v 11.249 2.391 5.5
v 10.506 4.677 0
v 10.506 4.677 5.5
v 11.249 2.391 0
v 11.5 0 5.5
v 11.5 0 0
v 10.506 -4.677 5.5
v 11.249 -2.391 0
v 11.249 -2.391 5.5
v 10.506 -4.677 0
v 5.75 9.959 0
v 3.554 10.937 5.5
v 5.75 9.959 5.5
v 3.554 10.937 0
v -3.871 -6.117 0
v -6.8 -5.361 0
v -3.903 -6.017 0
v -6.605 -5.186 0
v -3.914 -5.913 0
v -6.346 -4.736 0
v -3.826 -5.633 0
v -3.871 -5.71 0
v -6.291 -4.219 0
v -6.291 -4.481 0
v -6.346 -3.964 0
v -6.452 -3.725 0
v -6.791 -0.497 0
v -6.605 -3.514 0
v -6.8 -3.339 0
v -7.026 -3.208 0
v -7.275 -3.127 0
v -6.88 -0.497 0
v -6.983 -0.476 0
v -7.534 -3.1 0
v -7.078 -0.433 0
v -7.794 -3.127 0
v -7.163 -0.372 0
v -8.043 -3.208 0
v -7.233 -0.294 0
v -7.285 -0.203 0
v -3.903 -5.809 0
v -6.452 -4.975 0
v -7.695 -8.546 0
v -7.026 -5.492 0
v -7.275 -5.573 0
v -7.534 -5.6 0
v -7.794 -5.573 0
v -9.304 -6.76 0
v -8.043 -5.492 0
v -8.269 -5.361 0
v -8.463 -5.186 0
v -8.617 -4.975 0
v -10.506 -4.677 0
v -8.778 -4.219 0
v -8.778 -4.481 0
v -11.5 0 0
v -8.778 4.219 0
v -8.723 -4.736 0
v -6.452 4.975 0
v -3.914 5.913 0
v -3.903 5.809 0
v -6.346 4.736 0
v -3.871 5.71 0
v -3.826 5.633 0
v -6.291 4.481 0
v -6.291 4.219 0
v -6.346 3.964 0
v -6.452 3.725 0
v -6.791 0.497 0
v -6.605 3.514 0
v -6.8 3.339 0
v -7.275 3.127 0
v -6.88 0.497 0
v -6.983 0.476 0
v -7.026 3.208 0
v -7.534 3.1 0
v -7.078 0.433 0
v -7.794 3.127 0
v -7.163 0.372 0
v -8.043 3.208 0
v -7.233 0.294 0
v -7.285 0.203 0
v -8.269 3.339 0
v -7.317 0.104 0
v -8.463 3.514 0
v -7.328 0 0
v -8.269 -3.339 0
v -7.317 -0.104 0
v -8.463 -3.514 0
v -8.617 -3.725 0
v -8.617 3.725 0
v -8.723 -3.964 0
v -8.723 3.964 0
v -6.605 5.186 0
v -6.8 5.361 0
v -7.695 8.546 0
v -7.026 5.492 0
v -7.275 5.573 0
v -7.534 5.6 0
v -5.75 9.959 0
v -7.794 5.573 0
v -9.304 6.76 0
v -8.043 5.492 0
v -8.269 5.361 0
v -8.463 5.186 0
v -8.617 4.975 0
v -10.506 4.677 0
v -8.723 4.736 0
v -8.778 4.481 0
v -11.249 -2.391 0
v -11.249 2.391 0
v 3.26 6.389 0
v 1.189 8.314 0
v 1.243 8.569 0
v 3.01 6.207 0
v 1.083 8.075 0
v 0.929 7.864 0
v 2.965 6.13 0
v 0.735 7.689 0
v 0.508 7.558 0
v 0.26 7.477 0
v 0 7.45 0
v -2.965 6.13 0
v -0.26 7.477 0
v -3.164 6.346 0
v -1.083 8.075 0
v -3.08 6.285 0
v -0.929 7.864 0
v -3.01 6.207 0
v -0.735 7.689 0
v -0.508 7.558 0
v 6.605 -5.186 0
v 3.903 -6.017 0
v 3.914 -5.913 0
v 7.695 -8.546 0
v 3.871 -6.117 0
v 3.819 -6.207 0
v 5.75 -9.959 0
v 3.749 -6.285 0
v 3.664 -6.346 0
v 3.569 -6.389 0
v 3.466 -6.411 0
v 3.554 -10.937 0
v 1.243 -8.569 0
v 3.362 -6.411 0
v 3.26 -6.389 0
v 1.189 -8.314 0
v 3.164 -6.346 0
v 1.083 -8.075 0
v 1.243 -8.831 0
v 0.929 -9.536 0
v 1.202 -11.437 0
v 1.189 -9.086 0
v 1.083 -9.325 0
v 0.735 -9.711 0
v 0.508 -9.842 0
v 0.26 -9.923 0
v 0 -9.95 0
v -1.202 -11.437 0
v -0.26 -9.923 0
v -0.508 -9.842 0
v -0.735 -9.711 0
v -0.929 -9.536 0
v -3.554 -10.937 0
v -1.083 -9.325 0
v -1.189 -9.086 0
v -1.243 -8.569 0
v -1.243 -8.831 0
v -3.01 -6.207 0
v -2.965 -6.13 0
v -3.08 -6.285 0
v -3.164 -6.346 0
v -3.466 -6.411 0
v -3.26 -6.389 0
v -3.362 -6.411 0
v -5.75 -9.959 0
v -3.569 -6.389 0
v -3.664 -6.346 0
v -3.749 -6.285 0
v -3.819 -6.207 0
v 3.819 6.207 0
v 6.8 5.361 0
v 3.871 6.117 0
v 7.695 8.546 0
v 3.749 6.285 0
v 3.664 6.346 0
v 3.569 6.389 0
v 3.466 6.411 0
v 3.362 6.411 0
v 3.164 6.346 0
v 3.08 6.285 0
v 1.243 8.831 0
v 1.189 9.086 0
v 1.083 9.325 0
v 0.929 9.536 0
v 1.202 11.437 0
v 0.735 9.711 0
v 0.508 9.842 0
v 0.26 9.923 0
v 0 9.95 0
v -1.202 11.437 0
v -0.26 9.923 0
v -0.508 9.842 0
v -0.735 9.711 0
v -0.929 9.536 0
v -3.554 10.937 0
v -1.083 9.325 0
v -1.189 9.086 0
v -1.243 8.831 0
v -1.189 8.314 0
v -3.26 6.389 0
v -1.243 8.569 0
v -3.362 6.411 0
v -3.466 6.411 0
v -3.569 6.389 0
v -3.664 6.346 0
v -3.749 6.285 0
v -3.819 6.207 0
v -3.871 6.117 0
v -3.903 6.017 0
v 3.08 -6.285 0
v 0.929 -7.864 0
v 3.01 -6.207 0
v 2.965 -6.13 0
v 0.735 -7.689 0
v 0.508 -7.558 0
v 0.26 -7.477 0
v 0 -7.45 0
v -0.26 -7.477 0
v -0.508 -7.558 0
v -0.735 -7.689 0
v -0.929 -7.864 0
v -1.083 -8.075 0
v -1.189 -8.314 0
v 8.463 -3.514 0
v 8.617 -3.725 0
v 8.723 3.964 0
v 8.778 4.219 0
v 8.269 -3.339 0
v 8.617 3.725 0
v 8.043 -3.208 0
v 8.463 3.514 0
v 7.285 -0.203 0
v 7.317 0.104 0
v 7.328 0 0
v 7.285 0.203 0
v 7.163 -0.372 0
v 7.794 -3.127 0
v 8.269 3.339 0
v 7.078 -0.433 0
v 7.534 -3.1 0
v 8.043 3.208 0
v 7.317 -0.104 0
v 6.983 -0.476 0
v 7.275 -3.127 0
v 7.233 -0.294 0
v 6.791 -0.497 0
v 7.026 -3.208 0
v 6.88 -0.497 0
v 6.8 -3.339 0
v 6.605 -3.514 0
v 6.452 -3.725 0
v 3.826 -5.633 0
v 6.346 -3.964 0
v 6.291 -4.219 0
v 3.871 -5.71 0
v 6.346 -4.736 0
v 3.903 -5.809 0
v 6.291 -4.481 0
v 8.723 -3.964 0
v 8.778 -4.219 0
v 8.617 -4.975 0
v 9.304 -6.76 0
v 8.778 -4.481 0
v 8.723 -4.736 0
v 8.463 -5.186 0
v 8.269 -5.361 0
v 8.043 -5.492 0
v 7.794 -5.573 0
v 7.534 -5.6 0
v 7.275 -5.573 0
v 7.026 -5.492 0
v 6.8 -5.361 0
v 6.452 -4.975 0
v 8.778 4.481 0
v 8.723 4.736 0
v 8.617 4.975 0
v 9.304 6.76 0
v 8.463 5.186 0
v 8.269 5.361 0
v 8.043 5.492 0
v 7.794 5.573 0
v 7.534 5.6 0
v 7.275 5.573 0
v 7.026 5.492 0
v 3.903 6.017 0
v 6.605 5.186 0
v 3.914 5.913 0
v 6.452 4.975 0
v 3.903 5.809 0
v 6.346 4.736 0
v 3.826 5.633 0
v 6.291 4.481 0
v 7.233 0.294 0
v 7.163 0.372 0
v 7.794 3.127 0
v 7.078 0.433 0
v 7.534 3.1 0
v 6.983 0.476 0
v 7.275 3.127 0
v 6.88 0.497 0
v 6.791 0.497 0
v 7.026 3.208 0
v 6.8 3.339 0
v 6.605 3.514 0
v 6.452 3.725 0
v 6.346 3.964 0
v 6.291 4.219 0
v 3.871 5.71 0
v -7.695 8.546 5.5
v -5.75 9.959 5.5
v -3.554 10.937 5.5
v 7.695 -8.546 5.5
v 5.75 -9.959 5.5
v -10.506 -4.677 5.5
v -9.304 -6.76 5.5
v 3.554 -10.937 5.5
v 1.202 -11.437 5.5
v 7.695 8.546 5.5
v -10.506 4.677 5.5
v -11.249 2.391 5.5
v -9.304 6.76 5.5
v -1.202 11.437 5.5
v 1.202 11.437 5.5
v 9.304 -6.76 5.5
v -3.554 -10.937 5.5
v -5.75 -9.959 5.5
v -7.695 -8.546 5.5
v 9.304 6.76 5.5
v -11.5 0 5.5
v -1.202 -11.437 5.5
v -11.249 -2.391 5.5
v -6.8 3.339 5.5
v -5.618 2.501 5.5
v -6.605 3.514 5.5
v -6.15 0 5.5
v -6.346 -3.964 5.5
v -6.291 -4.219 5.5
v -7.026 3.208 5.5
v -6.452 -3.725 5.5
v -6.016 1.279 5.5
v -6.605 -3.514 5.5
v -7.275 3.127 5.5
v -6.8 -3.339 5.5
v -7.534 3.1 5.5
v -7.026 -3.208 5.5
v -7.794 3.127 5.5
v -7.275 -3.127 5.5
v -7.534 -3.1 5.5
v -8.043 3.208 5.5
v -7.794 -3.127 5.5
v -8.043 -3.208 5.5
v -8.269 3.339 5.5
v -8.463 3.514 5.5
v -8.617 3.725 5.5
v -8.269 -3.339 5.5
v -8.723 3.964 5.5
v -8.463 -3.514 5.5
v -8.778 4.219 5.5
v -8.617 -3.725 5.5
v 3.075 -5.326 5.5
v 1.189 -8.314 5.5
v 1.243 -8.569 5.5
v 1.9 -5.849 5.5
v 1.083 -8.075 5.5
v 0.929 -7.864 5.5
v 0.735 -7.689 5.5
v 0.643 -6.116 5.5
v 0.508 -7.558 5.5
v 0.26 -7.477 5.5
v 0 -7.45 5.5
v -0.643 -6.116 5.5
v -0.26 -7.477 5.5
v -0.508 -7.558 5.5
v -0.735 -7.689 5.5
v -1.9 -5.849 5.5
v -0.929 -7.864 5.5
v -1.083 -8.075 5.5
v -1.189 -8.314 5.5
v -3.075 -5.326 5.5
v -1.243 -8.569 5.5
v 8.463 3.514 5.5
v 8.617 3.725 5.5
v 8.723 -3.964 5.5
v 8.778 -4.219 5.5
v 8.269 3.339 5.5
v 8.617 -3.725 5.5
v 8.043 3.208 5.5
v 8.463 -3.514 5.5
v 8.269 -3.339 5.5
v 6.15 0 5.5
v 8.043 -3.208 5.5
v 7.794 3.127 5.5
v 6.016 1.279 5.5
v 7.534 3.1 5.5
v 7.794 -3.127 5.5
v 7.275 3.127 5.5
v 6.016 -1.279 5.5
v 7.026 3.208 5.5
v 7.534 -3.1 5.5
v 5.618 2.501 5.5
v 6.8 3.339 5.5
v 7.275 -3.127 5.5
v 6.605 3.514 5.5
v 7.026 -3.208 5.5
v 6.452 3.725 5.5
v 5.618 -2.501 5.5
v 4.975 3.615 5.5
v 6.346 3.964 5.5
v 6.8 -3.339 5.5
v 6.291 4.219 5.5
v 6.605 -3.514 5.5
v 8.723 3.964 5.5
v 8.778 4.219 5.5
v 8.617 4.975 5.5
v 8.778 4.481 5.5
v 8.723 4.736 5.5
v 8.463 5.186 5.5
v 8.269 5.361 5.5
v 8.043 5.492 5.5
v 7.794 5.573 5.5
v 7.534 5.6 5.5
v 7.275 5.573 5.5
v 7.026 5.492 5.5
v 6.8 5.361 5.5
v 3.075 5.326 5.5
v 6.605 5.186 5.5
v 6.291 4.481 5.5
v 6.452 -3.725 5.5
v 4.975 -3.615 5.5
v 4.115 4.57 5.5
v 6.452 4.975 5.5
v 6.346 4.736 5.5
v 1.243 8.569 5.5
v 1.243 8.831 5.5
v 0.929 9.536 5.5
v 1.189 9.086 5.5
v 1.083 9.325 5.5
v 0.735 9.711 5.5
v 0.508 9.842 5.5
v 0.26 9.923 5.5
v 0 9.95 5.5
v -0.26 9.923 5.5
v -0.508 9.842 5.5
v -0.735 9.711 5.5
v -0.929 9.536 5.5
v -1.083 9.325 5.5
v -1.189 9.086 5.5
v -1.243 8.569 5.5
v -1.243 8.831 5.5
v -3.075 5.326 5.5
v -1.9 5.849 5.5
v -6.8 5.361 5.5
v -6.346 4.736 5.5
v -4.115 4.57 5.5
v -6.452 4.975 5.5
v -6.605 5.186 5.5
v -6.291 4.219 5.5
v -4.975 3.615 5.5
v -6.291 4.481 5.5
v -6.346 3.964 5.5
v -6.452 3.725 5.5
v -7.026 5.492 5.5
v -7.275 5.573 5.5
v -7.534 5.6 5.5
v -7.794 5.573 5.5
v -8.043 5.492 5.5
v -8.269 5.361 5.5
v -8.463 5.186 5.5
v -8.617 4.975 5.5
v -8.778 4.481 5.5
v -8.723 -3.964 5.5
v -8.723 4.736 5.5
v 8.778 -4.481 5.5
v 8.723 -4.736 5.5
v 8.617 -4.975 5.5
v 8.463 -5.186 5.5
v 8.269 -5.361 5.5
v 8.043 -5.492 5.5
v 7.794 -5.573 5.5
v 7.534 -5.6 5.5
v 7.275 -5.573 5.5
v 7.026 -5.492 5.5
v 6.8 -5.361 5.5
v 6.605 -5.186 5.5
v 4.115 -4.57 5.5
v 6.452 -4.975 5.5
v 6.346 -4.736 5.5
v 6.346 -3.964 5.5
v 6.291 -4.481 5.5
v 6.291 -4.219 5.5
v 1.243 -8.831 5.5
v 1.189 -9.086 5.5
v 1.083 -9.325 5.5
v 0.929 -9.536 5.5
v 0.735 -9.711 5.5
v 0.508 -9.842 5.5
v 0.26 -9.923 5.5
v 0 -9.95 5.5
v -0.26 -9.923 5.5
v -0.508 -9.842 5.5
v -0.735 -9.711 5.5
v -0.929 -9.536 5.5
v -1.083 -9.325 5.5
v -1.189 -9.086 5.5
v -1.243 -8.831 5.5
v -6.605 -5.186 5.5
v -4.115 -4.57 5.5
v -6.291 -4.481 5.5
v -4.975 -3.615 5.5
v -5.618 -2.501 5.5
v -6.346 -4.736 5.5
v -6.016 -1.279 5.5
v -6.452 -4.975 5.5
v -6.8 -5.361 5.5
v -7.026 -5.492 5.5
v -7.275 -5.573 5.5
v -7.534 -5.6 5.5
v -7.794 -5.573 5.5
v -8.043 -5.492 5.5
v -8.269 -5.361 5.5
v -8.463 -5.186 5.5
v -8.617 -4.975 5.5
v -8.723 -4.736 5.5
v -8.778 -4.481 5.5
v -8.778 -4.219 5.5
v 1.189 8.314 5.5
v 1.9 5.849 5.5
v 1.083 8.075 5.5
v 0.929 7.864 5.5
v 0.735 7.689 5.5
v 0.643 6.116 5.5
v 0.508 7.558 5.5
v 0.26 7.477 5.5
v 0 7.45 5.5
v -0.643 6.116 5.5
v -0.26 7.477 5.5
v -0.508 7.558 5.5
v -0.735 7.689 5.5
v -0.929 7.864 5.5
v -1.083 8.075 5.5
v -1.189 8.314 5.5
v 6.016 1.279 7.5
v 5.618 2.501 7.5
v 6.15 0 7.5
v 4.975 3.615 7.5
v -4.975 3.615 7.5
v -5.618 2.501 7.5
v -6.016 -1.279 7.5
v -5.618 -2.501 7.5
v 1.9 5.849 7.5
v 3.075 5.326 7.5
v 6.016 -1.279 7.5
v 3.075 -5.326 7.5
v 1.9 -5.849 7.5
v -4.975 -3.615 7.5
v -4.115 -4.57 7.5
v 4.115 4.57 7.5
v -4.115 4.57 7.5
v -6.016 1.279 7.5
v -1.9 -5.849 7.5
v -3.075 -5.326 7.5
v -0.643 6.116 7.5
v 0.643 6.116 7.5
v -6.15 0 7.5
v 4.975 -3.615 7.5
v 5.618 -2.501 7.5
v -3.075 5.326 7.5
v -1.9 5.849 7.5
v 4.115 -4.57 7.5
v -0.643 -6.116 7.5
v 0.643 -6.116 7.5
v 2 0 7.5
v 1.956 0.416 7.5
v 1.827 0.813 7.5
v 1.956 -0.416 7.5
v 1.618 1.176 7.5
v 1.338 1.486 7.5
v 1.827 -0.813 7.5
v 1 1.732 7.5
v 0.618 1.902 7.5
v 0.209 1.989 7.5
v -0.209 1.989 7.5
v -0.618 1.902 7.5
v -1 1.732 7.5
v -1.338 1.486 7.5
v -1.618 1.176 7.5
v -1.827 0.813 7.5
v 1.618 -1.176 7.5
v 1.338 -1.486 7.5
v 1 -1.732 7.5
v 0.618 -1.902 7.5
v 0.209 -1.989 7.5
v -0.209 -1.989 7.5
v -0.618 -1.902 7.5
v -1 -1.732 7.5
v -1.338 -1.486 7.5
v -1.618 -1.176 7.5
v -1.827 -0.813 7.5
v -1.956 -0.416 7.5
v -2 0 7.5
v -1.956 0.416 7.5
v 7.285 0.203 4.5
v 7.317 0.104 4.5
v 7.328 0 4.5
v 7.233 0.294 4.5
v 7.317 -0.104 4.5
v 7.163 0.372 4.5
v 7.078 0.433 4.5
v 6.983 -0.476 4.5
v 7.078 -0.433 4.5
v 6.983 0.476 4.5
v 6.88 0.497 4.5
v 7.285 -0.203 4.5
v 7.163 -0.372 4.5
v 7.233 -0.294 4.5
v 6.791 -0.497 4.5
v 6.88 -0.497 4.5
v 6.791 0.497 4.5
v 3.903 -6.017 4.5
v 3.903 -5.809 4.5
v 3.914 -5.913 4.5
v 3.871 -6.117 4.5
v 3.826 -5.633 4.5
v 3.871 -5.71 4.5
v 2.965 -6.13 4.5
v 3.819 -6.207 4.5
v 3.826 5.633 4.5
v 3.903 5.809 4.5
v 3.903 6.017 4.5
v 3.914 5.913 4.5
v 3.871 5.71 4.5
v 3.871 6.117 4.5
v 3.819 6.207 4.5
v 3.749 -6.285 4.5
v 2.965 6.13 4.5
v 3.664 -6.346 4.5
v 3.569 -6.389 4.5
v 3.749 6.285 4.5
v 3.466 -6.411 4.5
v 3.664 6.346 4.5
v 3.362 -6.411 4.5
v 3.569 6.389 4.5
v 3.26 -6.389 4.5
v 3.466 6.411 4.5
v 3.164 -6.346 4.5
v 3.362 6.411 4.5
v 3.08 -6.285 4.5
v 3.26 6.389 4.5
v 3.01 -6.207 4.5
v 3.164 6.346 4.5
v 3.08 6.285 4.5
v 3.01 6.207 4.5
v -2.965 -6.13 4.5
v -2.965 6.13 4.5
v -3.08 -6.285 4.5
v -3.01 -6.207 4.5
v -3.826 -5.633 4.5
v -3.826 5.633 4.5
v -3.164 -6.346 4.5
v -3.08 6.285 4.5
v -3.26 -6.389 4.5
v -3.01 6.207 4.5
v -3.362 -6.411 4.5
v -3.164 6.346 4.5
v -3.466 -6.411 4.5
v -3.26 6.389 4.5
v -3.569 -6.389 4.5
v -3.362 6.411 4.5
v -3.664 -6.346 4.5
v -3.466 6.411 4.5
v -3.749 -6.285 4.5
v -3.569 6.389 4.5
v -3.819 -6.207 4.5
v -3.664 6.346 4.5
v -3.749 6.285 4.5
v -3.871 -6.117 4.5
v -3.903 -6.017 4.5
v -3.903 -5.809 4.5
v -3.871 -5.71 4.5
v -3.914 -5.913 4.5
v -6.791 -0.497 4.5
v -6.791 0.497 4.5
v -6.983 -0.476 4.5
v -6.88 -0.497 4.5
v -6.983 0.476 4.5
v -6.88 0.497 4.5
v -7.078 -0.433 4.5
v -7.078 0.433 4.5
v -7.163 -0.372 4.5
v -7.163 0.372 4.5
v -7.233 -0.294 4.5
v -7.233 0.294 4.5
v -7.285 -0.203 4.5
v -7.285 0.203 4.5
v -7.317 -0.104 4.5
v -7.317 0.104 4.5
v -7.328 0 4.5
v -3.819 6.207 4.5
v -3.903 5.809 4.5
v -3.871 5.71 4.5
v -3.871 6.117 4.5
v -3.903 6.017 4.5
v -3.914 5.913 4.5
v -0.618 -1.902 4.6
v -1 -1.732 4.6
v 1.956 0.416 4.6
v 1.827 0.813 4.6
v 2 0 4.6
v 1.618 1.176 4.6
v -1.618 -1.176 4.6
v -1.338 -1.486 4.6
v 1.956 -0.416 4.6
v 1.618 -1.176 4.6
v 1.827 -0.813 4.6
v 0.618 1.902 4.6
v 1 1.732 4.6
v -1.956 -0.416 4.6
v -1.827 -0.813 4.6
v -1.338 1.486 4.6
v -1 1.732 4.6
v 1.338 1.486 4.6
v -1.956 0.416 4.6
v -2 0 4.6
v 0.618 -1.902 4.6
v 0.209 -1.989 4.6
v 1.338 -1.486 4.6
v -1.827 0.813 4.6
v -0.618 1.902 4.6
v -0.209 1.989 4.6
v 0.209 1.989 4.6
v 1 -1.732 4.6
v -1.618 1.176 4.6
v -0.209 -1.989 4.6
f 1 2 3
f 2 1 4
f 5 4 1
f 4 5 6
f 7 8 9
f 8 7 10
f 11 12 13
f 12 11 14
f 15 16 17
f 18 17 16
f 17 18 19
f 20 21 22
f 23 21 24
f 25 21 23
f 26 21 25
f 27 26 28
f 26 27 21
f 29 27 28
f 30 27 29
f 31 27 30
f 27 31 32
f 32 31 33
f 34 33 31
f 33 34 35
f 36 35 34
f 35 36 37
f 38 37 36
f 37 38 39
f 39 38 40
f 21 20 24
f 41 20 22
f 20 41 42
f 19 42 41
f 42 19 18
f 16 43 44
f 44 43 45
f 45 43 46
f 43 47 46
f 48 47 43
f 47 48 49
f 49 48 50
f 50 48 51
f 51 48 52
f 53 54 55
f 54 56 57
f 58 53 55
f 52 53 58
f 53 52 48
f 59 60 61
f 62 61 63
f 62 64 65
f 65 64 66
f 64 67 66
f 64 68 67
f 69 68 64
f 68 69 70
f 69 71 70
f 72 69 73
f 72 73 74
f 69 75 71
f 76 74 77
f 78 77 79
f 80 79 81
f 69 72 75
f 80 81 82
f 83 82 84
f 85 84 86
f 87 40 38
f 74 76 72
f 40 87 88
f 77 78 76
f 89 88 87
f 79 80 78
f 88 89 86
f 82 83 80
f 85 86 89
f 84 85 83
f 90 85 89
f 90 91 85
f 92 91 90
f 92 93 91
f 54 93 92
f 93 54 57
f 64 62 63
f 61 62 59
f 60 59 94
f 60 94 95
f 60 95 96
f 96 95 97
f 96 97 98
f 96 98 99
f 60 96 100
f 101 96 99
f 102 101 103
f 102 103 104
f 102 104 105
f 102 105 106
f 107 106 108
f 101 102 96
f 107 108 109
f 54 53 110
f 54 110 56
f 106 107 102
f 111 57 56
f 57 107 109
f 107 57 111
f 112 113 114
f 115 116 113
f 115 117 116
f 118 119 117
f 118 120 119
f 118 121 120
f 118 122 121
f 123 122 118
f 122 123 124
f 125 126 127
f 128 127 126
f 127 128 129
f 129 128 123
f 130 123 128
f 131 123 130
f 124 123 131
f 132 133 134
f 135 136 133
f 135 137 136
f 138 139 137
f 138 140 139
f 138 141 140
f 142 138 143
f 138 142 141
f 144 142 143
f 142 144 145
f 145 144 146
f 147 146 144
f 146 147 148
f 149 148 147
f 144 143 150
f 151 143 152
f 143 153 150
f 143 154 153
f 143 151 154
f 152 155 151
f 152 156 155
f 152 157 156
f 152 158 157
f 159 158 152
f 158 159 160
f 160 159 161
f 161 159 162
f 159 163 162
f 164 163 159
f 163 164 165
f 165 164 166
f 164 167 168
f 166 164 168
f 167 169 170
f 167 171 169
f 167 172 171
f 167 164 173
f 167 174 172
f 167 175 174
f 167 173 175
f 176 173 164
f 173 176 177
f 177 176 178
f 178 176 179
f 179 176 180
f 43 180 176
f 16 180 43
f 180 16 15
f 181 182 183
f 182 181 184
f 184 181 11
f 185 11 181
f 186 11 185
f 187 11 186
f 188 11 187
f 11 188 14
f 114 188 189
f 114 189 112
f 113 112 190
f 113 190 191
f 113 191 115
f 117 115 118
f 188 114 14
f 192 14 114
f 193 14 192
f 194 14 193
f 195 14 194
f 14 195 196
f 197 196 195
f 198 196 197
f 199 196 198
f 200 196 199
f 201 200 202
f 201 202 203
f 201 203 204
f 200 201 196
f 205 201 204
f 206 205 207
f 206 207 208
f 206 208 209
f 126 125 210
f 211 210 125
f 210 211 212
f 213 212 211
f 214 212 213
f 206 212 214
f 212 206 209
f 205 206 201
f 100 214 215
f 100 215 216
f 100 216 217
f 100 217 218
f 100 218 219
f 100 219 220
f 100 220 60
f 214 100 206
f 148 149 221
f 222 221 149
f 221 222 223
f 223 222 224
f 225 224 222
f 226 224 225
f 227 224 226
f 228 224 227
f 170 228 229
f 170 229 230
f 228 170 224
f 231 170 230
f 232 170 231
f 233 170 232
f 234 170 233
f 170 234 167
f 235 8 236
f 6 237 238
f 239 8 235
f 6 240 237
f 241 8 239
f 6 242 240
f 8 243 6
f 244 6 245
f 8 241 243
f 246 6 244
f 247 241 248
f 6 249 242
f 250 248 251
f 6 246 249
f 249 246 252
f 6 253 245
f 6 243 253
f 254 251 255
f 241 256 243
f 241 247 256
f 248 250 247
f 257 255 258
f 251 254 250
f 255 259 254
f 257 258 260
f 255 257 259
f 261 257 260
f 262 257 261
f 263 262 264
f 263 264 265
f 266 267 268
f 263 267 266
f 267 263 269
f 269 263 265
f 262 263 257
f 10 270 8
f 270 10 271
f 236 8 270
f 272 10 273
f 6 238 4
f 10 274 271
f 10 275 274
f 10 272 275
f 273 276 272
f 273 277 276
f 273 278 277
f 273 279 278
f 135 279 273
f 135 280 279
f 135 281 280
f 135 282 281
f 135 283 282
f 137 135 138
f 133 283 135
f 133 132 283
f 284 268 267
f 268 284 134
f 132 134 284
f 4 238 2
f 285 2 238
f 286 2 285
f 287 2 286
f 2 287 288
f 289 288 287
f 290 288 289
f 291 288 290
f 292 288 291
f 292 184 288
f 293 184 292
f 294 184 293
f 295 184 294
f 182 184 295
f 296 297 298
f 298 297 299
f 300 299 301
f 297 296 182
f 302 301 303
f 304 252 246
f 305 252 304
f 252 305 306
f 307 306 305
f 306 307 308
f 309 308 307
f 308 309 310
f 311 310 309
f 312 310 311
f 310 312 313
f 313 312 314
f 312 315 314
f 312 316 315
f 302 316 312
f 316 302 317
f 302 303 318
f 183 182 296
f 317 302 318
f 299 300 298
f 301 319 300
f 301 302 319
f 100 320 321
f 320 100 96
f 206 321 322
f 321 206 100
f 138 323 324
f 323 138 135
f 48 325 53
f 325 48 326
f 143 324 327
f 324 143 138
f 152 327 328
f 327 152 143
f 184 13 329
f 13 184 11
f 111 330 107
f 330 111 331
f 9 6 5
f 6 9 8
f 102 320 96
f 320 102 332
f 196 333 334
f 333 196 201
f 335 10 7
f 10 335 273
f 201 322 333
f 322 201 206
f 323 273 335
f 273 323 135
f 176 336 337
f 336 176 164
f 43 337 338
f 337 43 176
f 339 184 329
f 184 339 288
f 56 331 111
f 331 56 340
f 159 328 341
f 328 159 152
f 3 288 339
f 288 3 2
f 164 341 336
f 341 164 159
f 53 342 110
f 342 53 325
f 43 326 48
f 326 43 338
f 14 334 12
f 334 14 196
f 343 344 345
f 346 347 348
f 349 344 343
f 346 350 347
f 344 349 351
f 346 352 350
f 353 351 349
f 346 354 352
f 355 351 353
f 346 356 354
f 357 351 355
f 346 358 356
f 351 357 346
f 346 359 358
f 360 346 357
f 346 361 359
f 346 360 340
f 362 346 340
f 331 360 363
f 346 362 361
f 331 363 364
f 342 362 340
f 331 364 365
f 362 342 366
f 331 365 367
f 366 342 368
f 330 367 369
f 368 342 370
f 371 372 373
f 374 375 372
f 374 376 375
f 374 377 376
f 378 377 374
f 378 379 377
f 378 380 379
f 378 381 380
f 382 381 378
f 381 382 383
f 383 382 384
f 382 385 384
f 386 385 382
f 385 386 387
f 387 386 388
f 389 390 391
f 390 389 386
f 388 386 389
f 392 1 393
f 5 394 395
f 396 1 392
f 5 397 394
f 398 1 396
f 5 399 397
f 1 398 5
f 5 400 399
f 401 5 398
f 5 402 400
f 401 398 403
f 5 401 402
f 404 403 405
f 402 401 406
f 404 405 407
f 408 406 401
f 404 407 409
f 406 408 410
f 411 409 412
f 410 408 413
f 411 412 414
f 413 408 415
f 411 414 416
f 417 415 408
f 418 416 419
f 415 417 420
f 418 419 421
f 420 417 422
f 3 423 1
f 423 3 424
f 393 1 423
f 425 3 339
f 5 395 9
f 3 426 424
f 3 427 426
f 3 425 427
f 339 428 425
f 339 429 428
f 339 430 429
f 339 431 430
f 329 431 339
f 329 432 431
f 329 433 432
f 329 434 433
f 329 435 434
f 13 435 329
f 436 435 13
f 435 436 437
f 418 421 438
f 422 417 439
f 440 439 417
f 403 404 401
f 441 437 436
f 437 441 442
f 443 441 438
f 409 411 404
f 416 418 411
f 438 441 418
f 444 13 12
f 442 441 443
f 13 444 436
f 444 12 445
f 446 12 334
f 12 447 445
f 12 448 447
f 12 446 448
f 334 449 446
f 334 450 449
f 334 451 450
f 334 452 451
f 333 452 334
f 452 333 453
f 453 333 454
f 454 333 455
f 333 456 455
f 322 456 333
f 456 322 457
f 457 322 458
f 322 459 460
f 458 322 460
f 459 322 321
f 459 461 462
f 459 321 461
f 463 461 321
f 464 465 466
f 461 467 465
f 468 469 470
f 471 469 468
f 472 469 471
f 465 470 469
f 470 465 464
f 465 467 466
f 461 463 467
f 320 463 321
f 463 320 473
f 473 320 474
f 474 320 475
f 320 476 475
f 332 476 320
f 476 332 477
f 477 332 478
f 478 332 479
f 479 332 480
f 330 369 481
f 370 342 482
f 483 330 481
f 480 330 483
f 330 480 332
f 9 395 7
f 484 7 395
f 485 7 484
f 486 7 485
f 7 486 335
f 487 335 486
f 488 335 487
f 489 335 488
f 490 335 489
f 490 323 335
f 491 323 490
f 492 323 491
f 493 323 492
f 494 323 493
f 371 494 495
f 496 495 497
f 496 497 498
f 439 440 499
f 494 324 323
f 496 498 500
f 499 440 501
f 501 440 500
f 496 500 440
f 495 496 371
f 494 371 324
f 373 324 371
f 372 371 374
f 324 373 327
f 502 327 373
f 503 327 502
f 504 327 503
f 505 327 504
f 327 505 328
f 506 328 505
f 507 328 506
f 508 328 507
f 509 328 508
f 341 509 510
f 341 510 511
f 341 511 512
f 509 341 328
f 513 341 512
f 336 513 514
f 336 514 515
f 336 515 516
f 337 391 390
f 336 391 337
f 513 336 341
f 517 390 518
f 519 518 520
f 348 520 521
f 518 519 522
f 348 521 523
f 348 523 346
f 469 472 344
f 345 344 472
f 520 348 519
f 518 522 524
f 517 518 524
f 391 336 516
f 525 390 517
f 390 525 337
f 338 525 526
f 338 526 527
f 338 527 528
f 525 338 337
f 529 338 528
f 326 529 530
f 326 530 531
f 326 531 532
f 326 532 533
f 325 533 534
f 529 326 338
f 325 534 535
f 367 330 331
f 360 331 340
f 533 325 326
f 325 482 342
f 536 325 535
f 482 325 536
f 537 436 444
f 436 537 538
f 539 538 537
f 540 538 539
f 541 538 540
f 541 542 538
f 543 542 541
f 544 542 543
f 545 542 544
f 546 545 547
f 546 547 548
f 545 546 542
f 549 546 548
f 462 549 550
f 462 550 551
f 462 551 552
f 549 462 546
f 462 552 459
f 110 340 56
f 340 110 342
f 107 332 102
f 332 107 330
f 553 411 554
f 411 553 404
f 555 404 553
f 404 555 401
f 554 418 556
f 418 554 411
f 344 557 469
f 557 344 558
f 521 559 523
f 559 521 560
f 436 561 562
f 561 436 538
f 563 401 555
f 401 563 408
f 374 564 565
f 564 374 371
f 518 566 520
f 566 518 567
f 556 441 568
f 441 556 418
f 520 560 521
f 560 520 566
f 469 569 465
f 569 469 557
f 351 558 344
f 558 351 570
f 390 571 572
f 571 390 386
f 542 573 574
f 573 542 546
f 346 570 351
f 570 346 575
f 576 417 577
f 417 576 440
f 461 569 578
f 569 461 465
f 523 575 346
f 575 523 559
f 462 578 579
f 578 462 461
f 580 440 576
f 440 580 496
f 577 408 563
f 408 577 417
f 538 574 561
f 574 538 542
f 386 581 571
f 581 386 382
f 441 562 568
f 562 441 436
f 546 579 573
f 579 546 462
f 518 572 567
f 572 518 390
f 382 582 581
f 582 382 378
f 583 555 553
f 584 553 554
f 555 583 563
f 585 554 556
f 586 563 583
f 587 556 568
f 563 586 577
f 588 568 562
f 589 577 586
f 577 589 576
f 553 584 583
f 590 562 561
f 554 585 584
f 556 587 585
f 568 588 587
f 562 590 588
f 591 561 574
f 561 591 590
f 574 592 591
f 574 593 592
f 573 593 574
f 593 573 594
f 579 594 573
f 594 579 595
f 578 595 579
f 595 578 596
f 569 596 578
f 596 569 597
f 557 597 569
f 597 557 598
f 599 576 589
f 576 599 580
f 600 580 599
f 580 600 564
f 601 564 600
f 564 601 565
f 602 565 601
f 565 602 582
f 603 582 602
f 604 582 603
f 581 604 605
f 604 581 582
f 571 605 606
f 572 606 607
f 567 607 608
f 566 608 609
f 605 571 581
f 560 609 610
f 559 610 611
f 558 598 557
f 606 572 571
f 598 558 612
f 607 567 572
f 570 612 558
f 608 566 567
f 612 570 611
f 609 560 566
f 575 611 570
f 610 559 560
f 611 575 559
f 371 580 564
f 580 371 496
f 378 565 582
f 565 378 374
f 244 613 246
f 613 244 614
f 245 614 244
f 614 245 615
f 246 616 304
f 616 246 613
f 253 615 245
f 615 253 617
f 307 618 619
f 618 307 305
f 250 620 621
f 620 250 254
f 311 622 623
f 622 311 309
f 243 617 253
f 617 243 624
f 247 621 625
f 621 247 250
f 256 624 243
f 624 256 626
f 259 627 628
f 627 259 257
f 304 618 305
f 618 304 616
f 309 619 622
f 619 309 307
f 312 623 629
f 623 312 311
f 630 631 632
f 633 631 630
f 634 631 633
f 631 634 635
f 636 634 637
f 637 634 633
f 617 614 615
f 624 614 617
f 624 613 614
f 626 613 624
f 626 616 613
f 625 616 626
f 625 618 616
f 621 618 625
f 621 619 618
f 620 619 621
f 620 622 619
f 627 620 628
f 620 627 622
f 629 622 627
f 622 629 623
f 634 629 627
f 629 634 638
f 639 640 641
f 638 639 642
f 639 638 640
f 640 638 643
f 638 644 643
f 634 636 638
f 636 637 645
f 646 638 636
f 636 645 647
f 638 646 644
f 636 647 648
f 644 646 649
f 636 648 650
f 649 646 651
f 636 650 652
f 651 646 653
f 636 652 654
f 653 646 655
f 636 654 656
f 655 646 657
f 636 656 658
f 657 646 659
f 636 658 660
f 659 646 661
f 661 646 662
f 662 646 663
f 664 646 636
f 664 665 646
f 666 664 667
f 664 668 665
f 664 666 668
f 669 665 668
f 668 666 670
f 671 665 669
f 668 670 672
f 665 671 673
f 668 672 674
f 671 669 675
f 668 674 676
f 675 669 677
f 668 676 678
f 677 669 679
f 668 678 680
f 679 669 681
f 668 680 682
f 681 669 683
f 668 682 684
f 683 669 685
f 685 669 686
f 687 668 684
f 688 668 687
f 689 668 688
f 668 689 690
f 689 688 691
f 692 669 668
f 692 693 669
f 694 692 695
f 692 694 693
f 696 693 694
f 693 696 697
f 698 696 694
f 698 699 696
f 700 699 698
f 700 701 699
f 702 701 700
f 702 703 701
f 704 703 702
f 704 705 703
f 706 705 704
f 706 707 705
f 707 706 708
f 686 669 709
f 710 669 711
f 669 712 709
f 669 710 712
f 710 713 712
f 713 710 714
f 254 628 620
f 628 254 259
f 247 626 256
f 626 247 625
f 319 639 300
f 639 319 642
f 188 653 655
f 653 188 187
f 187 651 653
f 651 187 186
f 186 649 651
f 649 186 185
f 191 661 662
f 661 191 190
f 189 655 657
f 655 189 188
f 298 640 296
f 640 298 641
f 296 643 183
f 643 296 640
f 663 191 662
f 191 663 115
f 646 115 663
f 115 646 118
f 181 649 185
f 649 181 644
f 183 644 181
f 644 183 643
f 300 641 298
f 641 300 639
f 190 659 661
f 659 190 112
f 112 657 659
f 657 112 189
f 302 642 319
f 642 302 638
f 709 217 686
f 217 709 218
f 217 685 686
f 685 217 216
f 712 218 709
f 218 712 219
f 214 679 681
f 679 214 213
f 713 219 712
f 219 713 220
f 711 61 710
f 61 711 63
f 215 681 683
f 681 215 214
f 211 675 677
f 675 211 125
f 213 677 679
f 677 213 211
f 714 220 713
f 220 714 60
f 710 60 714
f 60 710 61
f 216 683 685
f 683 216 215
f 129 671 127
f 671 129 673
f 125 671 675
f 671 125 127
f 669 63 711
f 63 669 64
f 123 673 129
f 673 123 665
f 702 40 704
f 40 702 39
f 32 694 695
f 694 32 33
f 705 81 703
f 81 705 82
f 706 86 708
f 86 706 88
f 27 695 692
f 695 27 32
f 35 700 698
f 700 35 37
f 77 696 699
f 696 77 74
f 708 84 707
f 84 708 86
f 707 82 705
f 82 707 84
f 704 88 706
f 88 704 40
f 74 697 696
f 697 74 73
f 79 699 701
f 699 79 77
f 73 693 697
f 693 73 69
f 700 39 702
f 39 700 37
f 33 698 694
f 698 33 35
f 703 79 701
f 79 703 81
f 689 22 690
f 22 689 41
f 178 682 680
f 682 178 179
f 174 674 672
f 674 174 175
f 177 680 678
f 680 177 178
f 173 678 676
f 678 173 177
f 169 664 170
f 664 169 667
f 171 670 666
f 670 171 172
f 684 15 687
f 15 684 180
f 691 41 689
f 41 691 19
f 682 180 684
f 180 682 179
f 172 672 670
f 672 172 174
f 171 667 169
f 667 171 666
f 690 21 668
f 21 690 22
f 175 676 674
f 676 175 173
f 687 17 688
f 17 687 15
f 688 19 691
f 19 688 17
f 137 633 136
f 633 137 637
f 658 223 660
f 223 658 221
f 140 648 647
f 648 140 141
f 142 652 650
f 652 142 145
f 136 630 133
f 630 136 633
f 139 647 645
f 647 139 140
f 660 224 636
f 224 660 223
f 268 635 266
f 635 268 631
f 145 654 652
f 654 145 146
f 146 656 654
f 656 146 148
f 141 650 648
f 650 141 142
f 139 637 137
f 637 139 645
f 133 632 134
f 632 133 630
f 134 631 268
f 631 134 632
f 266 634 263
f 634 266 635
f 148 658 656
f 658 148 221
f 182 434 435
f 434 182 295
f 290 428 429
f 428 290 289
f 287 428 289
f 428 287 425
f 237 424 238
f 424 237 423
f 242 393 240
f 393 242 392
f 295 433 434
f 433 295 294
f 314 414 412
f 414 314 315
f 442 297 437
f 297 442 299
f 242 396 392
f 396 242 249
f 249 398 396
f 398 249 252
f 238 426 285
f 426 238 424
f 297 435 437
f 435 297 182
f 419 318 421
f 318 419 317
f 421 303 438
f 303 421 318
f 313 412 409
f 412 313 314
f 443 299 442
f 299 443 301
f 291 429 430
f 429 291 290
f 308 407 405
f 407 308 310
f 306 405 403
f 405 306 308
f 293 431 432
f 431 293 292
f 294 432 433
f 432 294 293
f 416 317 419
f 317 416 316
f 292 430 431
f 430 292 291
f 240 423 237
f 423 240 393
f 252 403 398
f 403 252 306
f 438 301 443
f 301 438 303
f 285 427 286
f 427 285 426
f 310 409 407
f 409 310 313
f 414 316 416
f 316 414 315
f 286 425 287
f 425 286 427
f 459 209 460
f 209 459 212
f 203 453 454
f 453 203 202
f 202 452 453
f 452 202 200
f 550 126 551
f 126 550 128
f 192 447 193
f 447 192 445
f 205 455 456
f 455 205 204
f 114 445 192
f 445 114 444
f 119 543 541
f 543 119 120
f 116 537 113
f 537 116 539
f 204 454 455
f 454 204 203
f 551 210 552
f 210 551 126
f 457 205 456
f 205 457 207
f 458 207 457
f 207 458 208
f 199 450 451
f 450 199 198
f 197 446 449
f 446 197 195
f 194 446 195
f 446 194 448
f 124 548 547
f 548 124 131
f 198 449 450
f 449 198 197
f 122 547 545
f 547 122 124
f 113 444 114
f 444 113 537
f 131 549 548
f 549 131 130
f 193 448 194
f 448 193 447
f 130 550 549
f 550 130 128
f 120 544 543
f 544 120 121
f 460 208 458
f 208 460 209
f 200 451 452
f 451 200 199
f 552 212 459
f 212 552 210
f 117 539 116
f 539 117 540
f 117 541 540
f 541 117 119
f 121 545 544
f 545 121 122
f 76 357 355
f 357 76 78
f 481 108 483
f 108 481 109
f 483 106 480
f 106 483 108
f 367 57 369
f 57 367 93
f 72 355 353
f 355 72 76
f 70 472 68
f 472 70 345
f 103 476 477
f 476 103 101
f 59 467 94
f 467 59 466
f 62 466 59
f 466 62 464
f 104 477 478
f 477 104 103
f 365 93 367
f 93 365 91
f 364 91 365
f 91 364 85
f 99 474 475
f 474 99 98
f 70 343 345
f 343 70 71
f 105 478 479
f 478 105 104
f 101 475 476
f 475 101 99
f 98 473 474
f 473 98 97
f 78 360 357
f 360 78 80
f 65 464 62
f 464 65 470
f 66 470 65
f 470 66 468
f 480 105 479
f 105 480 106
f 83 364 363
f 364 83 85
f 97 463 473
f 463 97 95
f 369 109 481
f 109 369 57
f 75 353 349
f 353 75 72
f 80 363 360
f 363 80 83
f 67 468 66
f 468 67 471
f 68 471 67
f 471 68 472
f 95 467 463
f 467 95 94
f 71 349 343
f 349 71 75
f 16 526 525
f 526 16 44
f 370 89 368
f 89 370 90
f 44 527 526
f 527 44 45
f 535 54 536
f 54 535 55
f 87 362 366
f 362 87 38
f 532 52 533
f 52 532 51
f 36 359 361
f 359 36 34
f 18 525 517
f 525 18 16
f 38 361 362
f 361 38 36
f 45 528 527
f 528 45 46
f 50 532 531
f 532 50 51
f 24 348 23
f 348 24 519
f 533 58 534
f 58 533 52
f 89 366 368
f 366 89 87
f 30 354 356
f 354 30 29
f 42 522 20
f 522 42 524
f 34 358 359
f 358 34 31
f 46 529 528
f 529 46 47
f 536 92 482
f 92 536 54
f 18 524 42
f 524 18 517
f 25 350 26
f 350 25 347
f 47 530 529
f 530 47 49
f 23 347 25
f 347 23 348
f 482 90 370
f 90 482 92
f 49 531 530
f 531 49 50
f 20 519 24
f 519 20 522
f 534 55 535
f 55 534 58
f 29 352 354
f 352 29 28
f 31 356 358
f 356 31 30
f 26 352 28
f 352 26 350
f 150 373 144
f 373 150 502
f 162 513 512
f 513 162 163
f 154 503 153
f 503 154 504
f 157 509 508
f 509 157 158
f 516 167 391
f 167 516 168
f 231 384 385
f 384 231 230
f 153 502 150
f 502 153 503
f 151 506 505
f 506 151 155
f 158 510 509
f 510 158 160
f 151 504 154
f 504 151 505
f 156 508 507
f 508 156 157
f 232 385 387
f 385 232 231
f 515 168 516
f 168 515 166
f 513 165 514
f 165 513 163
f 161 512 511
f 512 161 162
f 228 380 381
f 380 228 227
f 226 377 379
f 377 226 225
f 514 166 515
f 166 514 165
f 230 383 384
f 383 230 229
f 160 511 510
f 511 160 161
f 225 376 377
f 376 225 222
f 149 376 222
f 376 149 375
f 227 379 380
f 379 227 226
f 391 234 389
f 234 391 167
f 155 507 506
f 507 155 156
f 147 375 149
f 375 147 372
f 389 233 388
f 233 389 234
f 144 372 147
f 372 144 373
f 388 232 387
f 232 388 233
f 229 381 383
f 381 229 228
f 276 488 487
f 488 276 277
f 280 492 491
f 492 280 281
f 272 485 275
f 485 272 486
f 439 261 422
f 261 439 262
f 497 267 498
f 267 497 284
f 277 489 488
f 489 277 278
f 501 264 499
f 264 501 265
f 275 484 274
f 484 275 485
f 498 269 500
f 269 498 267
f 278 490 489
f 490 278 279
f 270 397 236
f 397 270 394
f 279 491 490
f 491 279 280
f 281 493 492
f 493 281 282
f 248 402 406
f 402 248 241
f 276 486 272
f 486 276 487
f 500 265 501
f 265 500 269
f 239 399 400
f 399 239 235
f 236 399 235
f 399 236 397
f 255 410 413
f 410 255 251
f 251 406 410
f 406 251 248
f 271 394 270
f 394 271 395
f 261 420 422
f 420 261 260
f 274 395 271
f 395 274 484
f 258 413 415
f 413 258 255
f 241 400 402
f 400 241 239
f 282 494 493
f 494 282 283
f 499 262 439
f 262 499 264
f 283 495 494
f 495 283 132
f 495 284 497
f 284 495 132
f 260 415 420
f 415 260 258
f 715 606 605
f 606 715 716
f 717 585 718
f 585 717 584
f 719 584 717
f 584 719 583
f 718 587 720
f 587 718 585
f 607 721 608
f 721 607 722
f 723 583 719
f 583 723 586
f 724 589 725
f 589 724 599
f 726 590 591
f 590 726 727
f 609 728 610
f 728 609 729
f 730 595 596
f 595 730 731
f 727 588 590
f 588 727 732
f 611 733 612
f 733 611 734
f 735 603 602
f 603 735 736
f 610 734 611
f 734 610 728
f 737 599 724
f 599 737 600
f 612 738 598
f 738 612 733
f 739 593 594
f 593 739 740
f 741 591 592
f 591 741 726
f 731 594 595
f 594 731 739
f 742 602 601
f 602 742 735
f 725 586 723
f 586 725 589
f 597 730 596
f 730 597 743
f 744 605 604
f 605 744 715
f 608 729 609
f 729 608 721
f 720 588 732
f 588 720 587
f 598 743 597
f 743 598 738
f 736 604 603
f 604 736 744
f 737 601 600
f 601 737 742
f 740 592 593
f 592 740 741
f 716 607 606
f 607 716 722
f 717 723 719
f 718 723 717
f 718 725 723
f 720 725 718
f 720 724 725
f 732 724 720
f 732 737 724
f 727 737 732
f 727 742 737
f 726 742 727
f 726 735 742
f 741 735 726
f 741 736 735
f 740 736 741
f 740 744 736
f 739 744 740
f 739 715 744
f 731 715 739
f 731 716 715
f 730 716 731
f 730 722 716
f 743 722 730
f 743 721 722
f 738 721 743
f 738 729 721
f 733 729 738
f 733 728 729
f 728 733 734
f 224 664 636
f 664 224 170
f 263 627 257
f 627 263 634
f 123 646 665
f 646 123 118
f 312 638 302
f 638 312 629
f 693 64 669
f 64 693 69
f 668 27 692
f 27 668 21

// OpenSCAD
width = 1; //[1:0.5:25]

/* [Hidden] */

hex_radius = 6 / sin(60) + 0.15;
hex_depth = 4.5;

height = width + hex_depth;

base_radius = 23 / 2;

mounting_hole_radius = 17.4 / 2;

difference() {
    union() {
        //base
        cylinder(r = base_radius, h = height);

        translate([0, 0, height])
            cylinder(r = 12.3 / 2, h = 2, $fs = 0.1);
    }
    
    //center hole
    translate([0, 0, hex_depth + 0.1])
        cylinder(r = 2, h = 2+width, $fs = 0.1);
    
    //hex
    translate([0, 0, -1])
        cylinder(r = hex_radius, h = hex_depth + 1, $fn = 6);
    
    //rounded hex corners
    for(i = [0 : 5]) {
        rotate([0 ,0, i * 60])
            translate([hex_radius-0.25, 0, 0])
                cylinder(r = 0.5, h = hex_depth, $fs = 0.1);
    }
    
    //m3 holes
    for(i = [0 : 5]) {
        rotate([0 ,0, 30 + i * 60])
            translate([mounting_hole_radius, 0, -1])
                cylinder(r = 1.25, h = height+2, $fs = 0.1);
    }

}
